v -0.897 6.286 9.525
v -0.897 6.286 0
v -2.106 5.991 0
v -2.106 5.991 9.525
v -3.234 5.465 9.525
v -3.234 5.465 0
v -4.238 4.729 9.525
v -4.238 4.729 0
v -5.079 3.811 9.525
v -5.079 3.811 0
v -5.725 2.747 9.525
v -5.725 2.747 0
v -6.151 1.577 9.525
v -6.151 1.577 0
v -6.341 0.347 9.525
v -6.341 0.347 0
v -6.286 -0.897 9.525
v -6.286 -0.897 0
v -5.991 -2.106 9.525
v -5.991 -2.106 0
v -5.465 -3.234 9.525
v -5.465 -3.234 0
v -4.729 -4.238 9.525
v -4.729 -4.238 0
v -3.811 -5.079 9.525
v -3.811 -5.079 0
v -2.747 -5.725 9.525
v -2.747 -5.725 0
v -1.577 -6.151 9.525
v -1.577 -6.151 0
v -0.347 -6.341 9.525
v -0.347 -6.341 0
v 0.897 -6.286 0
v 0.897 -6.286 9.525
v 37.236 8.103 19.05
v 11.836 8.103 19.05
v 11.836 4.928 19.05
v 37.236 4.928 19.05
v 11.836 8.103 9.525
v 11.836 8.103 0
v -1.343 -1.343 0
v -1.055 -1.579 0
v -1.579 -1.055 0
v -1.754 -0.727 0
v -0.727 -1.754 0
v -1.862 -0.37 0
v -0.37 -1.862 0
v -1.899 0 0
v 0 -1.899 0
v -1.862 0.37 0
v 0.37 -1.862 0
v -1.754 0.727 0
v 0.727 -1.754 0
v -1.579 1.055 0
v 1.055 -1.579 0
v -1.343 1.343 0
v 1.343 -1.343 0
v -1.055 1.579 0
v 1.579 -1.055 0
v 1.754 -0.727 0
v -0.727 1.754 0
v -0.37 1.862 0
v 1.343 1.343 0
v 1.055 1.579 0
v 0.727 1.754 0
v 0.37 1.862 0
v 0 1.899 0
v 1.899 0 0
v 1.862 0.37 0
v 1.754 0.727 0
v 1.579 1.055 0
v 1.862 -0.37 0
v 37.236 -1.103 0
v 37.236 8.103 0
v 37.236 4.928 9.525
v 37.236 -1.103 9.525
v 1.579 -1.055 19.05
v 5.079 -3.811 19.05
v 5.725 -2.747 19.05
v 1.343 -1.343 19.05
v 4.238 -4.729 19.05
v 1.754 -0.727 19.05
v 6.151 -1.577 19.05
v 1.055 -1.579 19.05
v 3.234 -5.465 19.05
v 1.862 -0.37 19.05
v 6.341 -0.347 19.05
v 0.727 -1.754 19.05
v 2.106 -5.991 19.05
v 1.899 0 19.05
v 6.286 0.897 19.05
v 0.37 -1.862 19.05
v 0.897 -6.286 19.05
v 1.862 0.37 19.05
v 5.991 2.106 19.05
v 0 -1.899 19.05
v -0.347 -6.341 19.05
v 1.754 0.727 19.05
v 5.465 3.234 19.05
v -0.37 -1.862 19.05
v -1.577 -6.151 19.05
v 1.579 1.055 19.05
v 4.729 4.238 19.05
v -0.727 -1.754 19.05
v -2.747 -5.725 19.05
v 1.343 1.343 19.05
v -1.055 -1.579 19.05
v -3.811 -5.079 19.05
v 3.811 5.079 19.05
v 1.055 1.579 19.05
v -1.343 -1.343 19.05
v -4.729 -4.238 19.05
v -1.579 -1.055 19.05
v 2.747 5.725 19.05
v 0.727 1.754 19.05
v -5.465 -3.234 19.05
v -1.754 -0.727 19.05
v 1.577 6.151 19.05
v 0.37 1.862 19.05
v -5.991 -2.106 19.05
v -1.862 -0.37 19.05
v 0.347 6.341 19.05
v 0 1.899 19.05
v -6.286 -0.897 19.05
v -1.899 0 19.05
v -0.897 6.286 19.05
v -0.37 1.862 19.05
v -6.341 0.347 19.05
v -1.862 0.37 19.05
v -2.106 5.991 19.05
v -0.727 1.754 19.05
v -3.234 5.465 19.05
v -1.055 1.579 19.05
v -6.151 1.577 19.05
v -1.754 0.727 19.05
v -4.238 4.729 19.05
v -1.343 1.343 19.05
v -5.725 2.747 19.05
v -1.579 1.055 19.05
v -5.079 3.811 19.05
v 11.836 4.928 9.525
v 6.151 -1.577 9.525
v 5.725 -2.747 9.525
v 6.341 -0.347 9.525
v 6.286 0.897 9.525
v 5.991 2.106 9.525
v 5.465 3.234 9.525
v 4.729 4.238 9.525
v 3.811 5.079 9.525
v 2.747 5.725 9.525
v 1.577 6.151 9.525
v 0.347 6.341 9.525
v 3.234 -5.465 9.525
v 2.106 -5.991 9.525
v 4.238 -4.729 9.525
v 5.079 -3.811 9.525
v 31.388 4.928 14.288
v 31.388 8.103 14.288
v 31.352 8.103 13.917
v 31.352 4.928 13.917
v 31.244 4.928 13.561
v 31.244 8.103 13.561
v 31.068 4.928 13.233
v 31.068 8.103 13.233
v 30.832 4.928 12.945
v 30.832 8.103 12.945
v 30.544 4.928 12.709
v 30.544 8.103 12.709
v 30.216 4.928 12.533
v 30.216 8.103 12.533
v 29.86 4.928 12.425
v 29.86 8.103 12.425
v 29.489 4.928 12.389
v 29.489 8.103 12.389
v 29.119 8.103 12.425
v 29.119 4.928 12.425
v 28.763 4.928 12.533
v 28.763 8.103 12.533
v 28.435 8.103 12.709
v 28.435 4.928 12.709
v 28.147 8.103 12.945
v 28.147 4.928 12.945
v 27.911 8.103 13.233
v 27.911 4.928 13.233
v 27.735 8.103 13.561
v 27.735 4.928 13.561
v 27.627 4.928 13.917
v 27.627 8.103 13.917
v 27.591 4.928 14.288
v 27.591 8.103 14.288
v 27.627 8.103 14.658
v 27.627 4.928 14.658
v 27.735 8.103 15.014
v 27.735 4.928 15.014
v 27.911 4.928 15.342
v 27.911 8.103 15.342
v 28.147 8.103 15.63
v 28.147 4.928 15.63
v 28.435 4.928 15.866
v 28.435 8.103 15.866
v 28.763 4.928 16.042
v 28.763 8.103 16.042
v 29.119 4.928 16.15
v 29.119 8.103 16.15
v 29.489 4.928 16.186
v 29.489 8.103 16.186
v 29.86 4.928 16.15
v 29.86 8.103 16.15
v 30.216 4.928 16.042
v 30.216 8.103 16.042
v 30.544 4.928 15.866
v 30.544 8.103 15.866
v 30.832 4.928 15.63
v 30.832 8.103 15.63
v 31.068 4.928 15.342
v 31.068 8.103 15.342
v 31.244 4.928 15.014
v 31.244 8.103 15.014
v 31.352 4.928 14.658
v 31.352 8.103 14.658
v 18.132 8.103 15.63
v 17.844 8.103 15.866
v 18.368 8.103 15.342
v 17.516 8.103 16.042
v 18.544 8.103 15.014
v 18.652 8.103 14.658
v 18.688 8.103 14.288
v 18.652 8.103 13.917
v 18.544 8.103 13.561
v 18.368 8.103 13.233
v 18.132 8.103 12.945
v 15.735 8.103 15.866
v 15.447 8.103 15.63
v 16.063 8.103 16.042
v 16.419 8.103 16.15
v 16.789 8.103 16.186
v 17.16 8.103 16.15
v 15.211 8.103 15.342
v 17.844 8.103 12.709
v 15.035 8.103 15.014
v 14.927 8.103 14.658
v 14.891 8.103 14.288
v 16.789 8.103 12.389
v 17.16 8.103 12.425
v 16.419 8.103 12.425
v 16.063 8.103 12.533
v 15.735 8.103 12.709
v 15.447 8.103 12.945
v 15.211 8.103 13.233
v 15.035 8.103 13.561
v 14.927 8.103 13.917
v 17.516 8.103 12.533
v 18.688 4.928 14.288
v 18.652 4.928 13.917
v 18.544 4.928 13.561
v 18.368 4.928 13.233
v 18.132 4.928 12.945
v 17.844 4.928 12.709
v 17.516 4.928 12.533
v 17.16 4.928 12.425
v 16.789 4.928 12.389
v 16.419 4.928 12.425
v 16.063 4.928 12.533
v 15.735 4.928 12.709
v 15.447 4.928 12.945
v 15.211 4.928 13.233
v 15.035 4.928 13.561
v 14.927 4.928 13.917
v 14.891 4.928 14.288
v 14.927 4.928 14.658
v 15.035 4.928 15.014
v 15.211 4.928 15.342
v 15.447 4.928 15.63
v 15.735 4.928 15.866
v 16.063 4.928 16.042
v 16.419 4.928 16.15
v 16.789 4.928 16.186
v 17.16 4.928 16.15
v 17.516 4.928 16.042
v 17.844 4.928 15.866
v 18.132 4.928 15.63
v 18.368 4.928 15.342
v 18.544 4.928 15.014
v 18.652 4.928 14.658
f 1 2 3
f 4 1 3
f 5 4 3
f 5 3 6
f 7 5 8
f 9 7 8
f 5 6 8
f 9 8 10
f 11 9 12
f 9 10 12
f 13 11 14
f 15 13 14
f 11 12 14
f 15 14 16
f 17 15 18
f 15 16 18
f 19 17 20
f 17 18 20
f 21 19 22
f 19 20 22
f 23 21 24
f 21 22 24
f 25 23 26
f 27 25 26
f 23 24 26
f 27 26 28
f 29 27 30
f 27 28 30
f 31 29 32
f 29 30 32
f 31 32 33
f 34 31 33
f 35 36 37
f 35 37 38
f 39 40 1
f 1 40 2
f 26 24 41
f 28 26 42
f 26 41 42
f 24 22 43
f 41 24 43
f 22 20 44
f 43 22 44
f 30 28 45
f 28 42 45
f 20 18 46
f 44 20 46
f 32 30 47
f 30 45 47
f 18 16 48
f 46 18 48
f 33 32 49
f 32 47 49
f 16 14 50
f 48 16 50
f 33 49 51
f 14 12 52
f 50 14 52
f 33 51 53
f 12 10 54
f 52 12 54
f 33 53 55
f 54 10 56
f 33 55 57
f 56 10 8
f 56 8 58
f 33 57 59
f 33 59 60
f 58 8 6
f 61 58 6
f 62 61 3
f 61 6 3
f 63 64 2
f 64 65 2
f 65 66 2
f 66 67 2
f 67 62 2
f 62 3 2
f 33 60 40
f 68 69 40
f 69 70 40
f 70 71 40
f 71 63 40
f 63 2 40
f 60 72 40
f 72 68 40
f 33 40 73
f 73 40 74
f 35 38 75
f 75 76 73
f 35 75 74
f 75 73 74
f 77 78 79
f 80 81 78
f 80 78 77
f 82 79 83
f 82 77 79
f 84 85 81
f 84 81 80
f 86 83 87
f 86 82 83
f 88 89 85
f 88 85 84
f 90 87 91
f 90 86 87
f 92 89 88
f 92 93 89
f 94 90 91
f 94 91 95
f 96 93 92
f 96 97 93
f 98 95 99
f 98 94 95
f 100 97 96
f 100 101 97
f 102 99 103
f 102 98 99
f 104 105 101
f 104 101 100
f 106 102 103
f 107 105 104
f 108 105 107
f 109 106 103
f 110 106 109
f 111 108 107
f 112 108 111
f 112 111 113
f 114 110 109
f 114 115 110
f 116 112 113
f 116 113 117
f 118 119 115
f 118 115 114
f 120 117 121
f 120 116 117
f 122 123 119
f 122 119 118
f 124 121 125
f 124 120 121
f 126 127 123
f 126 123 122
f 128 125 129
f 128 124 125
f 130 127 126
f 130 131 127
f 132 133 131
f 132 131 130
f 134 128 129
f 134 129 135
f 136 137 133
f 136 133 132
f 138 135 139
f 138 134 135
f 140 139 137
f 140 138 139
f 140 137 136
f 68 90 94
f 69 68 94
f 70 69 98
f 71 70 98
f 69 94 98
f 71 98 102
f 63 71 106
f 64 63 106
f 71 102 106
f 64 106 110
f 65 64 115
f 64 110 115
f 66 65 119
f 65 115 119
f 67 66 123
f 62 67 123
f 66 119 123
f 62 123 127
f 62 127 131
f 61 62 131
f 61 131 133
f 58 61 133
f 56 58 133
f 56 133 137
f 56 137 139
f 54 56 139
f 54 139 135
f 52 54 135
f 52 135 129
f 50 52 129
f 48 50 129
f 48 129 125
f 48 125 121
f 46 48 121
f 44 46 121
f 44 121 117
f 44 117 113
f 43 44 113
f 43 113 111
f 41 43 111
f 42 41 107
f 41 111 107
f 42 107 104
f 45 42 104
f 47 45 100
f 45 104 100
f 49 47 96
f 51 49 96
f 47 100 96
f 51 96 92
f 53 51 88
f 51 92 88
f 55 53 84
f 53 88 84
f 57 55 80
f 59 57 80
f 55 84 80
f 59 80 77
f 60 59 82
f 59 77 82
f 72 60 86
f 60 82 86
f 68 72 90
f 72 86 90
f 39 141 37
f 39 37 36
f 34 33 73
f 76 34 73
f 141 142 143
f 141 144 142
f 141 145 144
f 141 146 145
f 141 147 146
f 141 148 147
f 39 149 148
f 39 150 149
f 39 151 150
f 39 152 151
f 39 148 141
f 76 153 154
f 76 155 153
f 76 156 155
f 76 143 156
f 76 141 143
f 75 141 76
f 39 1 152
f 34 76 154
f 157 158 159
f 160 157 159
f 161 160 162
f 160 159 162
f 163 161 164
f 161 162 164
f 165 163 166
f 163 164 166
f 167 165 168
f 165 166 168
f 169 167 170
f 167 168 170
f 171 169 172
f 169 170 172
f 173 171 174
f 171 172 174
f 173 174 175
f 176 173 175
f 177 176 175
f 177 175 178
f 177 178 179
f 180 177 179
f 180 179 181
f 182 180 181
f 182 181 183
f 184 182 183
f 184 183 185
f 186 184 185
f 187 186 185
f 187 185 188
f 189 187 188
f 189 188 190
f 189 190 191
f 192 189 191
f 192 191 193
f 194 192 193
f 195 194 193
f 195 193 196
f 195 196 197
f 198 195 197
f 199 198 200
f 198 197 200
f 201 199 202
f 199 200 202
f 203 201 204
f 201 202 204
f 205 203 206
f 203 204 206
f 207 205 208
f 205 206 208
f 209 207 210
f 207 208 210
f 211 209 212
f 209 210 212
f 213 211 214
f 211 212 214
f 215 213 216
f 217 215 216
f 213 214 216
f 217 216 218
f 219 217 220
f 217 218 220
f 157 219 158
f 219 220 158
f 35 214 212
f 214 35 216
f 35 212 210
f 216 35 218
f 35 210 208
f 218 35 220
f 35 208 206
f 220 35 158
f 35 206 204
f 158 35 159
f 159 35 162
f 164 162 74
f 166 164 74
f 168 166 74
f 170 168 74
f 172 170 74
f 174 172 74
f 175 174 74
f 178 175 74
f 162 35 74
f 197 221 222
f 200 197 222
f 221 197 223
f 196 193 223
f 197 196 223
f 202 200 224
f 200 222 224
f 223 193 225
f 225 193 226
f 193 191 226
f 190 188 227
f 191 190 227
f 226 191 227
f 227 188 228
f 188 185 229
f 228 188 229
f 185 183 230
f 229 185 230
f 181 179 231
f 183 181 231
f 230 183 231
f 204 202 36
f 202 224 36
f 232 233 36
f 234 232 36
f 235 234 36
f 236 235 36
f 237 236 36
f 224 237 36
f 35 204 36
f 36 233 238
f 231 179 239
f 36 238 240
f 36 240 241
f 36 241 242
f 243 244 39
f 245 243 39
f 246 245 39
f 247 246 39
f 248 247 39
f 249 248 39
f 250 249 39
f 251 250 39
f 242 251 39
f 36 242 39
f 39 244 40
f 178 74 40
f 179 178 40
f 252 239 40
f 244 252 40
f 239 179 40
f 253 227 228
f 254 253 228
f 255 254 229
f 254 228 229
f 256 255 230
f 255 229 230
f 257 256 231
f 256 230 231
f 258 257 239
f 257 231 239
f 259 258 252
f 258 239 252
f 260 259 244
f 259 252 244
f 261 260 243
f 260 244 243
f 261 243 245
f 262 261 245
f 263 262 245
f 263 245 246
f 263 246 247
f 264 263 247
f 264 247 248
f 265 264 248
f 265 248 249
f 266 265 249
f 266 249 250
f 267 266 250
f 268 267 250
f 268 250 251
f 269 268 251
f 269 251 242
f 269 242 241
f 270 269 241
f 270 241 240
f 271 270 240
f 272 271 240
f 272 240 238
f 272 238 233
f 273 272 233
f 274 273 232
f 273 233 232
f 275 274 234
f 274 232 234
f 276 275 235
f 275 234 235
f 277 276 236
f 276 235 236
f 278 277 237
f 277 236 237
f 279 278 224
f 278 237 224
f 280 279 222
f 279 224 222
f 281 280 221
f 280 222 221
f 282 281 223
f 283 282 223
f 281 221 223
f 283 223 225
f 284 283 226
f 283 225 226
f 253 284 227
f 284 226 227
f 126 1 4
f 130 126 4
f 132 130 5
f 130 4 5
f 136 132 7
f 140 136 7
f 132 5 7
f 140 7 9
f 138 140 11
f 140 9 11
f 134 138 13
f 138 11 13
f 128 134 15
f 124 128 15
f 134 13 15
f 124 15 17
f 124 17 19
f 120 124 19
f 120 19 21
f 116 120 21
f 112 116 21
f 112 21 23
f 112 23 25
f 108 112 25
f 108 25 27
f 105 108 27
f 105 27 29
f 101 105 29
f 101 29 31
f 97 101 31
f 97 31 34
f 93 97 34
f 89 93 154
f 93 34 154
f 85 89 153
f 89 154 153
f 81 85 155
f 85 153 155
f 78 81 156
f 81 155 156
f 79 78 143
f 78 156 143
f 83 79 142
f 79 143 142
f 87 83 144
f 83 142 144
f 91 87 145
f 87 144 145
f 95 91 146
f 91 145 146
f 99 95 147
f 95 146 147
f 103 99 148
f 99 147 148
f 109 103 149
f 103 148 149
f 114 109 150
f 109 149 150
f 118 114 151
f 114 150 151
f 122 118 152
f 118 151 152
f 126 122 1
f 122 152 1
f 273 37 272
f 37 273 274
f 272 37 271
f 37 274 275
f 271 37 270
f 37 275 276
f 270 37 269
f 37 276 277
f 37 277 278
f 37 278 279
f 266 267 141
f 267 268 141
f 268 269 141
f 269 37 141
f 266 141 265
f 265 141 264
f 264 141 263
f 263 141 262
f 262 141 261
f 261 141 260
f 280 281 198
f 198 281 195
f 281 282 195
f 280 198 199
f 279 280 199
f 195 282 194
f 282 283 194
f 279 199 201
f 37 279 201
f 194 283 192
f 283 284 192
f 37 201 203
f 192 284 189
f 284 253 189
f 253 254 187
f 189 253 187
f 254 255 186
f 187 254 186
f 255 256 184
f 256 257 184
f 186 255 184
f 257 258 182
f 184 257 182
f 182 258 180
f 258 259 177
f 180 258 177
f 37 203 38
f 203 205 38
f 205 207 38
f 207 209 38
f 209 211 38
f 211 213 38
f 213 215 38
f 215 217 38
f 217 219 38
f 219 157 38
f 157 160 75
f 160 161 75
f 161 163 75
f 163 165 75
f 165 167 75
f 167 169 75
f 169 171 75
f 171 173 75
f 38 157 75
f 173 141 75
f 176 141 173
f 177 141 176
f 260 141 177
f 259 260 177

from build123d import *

# Parameters (mm, degrees)
BOSS_EXTRUDE1_DEPTH   = 9.525
SKETCH4_R             = 6.35
SKETCH4_W             = 25.4
SKETCH4_H             = 3.175
BOSS_EXTRUDE2_DEPTH   = 9.525
F_6_CLEARANCE_HOLE1_D = 3.7973
F_6_CLEARANCE_HOLE2_D = 3.7973


with BuildPart() as part:
    # Sketch1 → Boss-Extrude1 (new body)
    with BuildSketch(Plane.XY):
        with BuildLine():
            Line((11.8364, 8.1026), (-0.896679191, 6.286371483))
            ThreePointArc((-0.896679191, 6.286371483), (-6.286371483, -0.896679191), (0.896679191, -6.286371483))
            Line((0.896679191, -6.286371483), (37.2364, -1.102924791))
            Line((37.2364, -1.102924791), (37.2364, 8.1026))
            Line((37.2364, 8.1026), (11.8364, 8.1026))
        make_face()
    extrude(amount=BOSS_EXTRUDE1_DEPTH)

    # Sketch4 → Boss-Extrude2 (add)
    with BuildSketch(Plane.XY.offset(9.525)):
        with Locations(Location((0, 0, 0), (0, 0, 98.117830505))):
            Circle(SKETCH4_R)
        with Locations((24.5364, 6.5151)):
            Rectangle(SKETCH4_W, SKETCH4_H)
    extrude(amount=BOSS_EXTRUDE2_DEPTH)

    # #6 Clearance Hole1 (through all)
    with Locations(Plane(origin=(0, 0, 0), x_dir=(-1, 0, 0), z_dir=(0, 0, -1))):
        with Locations((0, 0)):
            Hole(F_6_CLEARANCE_HOLE1_D / 2)

    # #6 Clearance Hole2 (through all)
    with Locations(Plane(origin=(16.7894, 4.9276, 14.2875), x_dir=(-1, 0, 0), z_dir=(0, -1, 0))):
        with Locations((0, 0), (-12.7, 0)):
            Hole(F_6_CLEARANCE_HOLE2_D / 2)


solid = part.part
